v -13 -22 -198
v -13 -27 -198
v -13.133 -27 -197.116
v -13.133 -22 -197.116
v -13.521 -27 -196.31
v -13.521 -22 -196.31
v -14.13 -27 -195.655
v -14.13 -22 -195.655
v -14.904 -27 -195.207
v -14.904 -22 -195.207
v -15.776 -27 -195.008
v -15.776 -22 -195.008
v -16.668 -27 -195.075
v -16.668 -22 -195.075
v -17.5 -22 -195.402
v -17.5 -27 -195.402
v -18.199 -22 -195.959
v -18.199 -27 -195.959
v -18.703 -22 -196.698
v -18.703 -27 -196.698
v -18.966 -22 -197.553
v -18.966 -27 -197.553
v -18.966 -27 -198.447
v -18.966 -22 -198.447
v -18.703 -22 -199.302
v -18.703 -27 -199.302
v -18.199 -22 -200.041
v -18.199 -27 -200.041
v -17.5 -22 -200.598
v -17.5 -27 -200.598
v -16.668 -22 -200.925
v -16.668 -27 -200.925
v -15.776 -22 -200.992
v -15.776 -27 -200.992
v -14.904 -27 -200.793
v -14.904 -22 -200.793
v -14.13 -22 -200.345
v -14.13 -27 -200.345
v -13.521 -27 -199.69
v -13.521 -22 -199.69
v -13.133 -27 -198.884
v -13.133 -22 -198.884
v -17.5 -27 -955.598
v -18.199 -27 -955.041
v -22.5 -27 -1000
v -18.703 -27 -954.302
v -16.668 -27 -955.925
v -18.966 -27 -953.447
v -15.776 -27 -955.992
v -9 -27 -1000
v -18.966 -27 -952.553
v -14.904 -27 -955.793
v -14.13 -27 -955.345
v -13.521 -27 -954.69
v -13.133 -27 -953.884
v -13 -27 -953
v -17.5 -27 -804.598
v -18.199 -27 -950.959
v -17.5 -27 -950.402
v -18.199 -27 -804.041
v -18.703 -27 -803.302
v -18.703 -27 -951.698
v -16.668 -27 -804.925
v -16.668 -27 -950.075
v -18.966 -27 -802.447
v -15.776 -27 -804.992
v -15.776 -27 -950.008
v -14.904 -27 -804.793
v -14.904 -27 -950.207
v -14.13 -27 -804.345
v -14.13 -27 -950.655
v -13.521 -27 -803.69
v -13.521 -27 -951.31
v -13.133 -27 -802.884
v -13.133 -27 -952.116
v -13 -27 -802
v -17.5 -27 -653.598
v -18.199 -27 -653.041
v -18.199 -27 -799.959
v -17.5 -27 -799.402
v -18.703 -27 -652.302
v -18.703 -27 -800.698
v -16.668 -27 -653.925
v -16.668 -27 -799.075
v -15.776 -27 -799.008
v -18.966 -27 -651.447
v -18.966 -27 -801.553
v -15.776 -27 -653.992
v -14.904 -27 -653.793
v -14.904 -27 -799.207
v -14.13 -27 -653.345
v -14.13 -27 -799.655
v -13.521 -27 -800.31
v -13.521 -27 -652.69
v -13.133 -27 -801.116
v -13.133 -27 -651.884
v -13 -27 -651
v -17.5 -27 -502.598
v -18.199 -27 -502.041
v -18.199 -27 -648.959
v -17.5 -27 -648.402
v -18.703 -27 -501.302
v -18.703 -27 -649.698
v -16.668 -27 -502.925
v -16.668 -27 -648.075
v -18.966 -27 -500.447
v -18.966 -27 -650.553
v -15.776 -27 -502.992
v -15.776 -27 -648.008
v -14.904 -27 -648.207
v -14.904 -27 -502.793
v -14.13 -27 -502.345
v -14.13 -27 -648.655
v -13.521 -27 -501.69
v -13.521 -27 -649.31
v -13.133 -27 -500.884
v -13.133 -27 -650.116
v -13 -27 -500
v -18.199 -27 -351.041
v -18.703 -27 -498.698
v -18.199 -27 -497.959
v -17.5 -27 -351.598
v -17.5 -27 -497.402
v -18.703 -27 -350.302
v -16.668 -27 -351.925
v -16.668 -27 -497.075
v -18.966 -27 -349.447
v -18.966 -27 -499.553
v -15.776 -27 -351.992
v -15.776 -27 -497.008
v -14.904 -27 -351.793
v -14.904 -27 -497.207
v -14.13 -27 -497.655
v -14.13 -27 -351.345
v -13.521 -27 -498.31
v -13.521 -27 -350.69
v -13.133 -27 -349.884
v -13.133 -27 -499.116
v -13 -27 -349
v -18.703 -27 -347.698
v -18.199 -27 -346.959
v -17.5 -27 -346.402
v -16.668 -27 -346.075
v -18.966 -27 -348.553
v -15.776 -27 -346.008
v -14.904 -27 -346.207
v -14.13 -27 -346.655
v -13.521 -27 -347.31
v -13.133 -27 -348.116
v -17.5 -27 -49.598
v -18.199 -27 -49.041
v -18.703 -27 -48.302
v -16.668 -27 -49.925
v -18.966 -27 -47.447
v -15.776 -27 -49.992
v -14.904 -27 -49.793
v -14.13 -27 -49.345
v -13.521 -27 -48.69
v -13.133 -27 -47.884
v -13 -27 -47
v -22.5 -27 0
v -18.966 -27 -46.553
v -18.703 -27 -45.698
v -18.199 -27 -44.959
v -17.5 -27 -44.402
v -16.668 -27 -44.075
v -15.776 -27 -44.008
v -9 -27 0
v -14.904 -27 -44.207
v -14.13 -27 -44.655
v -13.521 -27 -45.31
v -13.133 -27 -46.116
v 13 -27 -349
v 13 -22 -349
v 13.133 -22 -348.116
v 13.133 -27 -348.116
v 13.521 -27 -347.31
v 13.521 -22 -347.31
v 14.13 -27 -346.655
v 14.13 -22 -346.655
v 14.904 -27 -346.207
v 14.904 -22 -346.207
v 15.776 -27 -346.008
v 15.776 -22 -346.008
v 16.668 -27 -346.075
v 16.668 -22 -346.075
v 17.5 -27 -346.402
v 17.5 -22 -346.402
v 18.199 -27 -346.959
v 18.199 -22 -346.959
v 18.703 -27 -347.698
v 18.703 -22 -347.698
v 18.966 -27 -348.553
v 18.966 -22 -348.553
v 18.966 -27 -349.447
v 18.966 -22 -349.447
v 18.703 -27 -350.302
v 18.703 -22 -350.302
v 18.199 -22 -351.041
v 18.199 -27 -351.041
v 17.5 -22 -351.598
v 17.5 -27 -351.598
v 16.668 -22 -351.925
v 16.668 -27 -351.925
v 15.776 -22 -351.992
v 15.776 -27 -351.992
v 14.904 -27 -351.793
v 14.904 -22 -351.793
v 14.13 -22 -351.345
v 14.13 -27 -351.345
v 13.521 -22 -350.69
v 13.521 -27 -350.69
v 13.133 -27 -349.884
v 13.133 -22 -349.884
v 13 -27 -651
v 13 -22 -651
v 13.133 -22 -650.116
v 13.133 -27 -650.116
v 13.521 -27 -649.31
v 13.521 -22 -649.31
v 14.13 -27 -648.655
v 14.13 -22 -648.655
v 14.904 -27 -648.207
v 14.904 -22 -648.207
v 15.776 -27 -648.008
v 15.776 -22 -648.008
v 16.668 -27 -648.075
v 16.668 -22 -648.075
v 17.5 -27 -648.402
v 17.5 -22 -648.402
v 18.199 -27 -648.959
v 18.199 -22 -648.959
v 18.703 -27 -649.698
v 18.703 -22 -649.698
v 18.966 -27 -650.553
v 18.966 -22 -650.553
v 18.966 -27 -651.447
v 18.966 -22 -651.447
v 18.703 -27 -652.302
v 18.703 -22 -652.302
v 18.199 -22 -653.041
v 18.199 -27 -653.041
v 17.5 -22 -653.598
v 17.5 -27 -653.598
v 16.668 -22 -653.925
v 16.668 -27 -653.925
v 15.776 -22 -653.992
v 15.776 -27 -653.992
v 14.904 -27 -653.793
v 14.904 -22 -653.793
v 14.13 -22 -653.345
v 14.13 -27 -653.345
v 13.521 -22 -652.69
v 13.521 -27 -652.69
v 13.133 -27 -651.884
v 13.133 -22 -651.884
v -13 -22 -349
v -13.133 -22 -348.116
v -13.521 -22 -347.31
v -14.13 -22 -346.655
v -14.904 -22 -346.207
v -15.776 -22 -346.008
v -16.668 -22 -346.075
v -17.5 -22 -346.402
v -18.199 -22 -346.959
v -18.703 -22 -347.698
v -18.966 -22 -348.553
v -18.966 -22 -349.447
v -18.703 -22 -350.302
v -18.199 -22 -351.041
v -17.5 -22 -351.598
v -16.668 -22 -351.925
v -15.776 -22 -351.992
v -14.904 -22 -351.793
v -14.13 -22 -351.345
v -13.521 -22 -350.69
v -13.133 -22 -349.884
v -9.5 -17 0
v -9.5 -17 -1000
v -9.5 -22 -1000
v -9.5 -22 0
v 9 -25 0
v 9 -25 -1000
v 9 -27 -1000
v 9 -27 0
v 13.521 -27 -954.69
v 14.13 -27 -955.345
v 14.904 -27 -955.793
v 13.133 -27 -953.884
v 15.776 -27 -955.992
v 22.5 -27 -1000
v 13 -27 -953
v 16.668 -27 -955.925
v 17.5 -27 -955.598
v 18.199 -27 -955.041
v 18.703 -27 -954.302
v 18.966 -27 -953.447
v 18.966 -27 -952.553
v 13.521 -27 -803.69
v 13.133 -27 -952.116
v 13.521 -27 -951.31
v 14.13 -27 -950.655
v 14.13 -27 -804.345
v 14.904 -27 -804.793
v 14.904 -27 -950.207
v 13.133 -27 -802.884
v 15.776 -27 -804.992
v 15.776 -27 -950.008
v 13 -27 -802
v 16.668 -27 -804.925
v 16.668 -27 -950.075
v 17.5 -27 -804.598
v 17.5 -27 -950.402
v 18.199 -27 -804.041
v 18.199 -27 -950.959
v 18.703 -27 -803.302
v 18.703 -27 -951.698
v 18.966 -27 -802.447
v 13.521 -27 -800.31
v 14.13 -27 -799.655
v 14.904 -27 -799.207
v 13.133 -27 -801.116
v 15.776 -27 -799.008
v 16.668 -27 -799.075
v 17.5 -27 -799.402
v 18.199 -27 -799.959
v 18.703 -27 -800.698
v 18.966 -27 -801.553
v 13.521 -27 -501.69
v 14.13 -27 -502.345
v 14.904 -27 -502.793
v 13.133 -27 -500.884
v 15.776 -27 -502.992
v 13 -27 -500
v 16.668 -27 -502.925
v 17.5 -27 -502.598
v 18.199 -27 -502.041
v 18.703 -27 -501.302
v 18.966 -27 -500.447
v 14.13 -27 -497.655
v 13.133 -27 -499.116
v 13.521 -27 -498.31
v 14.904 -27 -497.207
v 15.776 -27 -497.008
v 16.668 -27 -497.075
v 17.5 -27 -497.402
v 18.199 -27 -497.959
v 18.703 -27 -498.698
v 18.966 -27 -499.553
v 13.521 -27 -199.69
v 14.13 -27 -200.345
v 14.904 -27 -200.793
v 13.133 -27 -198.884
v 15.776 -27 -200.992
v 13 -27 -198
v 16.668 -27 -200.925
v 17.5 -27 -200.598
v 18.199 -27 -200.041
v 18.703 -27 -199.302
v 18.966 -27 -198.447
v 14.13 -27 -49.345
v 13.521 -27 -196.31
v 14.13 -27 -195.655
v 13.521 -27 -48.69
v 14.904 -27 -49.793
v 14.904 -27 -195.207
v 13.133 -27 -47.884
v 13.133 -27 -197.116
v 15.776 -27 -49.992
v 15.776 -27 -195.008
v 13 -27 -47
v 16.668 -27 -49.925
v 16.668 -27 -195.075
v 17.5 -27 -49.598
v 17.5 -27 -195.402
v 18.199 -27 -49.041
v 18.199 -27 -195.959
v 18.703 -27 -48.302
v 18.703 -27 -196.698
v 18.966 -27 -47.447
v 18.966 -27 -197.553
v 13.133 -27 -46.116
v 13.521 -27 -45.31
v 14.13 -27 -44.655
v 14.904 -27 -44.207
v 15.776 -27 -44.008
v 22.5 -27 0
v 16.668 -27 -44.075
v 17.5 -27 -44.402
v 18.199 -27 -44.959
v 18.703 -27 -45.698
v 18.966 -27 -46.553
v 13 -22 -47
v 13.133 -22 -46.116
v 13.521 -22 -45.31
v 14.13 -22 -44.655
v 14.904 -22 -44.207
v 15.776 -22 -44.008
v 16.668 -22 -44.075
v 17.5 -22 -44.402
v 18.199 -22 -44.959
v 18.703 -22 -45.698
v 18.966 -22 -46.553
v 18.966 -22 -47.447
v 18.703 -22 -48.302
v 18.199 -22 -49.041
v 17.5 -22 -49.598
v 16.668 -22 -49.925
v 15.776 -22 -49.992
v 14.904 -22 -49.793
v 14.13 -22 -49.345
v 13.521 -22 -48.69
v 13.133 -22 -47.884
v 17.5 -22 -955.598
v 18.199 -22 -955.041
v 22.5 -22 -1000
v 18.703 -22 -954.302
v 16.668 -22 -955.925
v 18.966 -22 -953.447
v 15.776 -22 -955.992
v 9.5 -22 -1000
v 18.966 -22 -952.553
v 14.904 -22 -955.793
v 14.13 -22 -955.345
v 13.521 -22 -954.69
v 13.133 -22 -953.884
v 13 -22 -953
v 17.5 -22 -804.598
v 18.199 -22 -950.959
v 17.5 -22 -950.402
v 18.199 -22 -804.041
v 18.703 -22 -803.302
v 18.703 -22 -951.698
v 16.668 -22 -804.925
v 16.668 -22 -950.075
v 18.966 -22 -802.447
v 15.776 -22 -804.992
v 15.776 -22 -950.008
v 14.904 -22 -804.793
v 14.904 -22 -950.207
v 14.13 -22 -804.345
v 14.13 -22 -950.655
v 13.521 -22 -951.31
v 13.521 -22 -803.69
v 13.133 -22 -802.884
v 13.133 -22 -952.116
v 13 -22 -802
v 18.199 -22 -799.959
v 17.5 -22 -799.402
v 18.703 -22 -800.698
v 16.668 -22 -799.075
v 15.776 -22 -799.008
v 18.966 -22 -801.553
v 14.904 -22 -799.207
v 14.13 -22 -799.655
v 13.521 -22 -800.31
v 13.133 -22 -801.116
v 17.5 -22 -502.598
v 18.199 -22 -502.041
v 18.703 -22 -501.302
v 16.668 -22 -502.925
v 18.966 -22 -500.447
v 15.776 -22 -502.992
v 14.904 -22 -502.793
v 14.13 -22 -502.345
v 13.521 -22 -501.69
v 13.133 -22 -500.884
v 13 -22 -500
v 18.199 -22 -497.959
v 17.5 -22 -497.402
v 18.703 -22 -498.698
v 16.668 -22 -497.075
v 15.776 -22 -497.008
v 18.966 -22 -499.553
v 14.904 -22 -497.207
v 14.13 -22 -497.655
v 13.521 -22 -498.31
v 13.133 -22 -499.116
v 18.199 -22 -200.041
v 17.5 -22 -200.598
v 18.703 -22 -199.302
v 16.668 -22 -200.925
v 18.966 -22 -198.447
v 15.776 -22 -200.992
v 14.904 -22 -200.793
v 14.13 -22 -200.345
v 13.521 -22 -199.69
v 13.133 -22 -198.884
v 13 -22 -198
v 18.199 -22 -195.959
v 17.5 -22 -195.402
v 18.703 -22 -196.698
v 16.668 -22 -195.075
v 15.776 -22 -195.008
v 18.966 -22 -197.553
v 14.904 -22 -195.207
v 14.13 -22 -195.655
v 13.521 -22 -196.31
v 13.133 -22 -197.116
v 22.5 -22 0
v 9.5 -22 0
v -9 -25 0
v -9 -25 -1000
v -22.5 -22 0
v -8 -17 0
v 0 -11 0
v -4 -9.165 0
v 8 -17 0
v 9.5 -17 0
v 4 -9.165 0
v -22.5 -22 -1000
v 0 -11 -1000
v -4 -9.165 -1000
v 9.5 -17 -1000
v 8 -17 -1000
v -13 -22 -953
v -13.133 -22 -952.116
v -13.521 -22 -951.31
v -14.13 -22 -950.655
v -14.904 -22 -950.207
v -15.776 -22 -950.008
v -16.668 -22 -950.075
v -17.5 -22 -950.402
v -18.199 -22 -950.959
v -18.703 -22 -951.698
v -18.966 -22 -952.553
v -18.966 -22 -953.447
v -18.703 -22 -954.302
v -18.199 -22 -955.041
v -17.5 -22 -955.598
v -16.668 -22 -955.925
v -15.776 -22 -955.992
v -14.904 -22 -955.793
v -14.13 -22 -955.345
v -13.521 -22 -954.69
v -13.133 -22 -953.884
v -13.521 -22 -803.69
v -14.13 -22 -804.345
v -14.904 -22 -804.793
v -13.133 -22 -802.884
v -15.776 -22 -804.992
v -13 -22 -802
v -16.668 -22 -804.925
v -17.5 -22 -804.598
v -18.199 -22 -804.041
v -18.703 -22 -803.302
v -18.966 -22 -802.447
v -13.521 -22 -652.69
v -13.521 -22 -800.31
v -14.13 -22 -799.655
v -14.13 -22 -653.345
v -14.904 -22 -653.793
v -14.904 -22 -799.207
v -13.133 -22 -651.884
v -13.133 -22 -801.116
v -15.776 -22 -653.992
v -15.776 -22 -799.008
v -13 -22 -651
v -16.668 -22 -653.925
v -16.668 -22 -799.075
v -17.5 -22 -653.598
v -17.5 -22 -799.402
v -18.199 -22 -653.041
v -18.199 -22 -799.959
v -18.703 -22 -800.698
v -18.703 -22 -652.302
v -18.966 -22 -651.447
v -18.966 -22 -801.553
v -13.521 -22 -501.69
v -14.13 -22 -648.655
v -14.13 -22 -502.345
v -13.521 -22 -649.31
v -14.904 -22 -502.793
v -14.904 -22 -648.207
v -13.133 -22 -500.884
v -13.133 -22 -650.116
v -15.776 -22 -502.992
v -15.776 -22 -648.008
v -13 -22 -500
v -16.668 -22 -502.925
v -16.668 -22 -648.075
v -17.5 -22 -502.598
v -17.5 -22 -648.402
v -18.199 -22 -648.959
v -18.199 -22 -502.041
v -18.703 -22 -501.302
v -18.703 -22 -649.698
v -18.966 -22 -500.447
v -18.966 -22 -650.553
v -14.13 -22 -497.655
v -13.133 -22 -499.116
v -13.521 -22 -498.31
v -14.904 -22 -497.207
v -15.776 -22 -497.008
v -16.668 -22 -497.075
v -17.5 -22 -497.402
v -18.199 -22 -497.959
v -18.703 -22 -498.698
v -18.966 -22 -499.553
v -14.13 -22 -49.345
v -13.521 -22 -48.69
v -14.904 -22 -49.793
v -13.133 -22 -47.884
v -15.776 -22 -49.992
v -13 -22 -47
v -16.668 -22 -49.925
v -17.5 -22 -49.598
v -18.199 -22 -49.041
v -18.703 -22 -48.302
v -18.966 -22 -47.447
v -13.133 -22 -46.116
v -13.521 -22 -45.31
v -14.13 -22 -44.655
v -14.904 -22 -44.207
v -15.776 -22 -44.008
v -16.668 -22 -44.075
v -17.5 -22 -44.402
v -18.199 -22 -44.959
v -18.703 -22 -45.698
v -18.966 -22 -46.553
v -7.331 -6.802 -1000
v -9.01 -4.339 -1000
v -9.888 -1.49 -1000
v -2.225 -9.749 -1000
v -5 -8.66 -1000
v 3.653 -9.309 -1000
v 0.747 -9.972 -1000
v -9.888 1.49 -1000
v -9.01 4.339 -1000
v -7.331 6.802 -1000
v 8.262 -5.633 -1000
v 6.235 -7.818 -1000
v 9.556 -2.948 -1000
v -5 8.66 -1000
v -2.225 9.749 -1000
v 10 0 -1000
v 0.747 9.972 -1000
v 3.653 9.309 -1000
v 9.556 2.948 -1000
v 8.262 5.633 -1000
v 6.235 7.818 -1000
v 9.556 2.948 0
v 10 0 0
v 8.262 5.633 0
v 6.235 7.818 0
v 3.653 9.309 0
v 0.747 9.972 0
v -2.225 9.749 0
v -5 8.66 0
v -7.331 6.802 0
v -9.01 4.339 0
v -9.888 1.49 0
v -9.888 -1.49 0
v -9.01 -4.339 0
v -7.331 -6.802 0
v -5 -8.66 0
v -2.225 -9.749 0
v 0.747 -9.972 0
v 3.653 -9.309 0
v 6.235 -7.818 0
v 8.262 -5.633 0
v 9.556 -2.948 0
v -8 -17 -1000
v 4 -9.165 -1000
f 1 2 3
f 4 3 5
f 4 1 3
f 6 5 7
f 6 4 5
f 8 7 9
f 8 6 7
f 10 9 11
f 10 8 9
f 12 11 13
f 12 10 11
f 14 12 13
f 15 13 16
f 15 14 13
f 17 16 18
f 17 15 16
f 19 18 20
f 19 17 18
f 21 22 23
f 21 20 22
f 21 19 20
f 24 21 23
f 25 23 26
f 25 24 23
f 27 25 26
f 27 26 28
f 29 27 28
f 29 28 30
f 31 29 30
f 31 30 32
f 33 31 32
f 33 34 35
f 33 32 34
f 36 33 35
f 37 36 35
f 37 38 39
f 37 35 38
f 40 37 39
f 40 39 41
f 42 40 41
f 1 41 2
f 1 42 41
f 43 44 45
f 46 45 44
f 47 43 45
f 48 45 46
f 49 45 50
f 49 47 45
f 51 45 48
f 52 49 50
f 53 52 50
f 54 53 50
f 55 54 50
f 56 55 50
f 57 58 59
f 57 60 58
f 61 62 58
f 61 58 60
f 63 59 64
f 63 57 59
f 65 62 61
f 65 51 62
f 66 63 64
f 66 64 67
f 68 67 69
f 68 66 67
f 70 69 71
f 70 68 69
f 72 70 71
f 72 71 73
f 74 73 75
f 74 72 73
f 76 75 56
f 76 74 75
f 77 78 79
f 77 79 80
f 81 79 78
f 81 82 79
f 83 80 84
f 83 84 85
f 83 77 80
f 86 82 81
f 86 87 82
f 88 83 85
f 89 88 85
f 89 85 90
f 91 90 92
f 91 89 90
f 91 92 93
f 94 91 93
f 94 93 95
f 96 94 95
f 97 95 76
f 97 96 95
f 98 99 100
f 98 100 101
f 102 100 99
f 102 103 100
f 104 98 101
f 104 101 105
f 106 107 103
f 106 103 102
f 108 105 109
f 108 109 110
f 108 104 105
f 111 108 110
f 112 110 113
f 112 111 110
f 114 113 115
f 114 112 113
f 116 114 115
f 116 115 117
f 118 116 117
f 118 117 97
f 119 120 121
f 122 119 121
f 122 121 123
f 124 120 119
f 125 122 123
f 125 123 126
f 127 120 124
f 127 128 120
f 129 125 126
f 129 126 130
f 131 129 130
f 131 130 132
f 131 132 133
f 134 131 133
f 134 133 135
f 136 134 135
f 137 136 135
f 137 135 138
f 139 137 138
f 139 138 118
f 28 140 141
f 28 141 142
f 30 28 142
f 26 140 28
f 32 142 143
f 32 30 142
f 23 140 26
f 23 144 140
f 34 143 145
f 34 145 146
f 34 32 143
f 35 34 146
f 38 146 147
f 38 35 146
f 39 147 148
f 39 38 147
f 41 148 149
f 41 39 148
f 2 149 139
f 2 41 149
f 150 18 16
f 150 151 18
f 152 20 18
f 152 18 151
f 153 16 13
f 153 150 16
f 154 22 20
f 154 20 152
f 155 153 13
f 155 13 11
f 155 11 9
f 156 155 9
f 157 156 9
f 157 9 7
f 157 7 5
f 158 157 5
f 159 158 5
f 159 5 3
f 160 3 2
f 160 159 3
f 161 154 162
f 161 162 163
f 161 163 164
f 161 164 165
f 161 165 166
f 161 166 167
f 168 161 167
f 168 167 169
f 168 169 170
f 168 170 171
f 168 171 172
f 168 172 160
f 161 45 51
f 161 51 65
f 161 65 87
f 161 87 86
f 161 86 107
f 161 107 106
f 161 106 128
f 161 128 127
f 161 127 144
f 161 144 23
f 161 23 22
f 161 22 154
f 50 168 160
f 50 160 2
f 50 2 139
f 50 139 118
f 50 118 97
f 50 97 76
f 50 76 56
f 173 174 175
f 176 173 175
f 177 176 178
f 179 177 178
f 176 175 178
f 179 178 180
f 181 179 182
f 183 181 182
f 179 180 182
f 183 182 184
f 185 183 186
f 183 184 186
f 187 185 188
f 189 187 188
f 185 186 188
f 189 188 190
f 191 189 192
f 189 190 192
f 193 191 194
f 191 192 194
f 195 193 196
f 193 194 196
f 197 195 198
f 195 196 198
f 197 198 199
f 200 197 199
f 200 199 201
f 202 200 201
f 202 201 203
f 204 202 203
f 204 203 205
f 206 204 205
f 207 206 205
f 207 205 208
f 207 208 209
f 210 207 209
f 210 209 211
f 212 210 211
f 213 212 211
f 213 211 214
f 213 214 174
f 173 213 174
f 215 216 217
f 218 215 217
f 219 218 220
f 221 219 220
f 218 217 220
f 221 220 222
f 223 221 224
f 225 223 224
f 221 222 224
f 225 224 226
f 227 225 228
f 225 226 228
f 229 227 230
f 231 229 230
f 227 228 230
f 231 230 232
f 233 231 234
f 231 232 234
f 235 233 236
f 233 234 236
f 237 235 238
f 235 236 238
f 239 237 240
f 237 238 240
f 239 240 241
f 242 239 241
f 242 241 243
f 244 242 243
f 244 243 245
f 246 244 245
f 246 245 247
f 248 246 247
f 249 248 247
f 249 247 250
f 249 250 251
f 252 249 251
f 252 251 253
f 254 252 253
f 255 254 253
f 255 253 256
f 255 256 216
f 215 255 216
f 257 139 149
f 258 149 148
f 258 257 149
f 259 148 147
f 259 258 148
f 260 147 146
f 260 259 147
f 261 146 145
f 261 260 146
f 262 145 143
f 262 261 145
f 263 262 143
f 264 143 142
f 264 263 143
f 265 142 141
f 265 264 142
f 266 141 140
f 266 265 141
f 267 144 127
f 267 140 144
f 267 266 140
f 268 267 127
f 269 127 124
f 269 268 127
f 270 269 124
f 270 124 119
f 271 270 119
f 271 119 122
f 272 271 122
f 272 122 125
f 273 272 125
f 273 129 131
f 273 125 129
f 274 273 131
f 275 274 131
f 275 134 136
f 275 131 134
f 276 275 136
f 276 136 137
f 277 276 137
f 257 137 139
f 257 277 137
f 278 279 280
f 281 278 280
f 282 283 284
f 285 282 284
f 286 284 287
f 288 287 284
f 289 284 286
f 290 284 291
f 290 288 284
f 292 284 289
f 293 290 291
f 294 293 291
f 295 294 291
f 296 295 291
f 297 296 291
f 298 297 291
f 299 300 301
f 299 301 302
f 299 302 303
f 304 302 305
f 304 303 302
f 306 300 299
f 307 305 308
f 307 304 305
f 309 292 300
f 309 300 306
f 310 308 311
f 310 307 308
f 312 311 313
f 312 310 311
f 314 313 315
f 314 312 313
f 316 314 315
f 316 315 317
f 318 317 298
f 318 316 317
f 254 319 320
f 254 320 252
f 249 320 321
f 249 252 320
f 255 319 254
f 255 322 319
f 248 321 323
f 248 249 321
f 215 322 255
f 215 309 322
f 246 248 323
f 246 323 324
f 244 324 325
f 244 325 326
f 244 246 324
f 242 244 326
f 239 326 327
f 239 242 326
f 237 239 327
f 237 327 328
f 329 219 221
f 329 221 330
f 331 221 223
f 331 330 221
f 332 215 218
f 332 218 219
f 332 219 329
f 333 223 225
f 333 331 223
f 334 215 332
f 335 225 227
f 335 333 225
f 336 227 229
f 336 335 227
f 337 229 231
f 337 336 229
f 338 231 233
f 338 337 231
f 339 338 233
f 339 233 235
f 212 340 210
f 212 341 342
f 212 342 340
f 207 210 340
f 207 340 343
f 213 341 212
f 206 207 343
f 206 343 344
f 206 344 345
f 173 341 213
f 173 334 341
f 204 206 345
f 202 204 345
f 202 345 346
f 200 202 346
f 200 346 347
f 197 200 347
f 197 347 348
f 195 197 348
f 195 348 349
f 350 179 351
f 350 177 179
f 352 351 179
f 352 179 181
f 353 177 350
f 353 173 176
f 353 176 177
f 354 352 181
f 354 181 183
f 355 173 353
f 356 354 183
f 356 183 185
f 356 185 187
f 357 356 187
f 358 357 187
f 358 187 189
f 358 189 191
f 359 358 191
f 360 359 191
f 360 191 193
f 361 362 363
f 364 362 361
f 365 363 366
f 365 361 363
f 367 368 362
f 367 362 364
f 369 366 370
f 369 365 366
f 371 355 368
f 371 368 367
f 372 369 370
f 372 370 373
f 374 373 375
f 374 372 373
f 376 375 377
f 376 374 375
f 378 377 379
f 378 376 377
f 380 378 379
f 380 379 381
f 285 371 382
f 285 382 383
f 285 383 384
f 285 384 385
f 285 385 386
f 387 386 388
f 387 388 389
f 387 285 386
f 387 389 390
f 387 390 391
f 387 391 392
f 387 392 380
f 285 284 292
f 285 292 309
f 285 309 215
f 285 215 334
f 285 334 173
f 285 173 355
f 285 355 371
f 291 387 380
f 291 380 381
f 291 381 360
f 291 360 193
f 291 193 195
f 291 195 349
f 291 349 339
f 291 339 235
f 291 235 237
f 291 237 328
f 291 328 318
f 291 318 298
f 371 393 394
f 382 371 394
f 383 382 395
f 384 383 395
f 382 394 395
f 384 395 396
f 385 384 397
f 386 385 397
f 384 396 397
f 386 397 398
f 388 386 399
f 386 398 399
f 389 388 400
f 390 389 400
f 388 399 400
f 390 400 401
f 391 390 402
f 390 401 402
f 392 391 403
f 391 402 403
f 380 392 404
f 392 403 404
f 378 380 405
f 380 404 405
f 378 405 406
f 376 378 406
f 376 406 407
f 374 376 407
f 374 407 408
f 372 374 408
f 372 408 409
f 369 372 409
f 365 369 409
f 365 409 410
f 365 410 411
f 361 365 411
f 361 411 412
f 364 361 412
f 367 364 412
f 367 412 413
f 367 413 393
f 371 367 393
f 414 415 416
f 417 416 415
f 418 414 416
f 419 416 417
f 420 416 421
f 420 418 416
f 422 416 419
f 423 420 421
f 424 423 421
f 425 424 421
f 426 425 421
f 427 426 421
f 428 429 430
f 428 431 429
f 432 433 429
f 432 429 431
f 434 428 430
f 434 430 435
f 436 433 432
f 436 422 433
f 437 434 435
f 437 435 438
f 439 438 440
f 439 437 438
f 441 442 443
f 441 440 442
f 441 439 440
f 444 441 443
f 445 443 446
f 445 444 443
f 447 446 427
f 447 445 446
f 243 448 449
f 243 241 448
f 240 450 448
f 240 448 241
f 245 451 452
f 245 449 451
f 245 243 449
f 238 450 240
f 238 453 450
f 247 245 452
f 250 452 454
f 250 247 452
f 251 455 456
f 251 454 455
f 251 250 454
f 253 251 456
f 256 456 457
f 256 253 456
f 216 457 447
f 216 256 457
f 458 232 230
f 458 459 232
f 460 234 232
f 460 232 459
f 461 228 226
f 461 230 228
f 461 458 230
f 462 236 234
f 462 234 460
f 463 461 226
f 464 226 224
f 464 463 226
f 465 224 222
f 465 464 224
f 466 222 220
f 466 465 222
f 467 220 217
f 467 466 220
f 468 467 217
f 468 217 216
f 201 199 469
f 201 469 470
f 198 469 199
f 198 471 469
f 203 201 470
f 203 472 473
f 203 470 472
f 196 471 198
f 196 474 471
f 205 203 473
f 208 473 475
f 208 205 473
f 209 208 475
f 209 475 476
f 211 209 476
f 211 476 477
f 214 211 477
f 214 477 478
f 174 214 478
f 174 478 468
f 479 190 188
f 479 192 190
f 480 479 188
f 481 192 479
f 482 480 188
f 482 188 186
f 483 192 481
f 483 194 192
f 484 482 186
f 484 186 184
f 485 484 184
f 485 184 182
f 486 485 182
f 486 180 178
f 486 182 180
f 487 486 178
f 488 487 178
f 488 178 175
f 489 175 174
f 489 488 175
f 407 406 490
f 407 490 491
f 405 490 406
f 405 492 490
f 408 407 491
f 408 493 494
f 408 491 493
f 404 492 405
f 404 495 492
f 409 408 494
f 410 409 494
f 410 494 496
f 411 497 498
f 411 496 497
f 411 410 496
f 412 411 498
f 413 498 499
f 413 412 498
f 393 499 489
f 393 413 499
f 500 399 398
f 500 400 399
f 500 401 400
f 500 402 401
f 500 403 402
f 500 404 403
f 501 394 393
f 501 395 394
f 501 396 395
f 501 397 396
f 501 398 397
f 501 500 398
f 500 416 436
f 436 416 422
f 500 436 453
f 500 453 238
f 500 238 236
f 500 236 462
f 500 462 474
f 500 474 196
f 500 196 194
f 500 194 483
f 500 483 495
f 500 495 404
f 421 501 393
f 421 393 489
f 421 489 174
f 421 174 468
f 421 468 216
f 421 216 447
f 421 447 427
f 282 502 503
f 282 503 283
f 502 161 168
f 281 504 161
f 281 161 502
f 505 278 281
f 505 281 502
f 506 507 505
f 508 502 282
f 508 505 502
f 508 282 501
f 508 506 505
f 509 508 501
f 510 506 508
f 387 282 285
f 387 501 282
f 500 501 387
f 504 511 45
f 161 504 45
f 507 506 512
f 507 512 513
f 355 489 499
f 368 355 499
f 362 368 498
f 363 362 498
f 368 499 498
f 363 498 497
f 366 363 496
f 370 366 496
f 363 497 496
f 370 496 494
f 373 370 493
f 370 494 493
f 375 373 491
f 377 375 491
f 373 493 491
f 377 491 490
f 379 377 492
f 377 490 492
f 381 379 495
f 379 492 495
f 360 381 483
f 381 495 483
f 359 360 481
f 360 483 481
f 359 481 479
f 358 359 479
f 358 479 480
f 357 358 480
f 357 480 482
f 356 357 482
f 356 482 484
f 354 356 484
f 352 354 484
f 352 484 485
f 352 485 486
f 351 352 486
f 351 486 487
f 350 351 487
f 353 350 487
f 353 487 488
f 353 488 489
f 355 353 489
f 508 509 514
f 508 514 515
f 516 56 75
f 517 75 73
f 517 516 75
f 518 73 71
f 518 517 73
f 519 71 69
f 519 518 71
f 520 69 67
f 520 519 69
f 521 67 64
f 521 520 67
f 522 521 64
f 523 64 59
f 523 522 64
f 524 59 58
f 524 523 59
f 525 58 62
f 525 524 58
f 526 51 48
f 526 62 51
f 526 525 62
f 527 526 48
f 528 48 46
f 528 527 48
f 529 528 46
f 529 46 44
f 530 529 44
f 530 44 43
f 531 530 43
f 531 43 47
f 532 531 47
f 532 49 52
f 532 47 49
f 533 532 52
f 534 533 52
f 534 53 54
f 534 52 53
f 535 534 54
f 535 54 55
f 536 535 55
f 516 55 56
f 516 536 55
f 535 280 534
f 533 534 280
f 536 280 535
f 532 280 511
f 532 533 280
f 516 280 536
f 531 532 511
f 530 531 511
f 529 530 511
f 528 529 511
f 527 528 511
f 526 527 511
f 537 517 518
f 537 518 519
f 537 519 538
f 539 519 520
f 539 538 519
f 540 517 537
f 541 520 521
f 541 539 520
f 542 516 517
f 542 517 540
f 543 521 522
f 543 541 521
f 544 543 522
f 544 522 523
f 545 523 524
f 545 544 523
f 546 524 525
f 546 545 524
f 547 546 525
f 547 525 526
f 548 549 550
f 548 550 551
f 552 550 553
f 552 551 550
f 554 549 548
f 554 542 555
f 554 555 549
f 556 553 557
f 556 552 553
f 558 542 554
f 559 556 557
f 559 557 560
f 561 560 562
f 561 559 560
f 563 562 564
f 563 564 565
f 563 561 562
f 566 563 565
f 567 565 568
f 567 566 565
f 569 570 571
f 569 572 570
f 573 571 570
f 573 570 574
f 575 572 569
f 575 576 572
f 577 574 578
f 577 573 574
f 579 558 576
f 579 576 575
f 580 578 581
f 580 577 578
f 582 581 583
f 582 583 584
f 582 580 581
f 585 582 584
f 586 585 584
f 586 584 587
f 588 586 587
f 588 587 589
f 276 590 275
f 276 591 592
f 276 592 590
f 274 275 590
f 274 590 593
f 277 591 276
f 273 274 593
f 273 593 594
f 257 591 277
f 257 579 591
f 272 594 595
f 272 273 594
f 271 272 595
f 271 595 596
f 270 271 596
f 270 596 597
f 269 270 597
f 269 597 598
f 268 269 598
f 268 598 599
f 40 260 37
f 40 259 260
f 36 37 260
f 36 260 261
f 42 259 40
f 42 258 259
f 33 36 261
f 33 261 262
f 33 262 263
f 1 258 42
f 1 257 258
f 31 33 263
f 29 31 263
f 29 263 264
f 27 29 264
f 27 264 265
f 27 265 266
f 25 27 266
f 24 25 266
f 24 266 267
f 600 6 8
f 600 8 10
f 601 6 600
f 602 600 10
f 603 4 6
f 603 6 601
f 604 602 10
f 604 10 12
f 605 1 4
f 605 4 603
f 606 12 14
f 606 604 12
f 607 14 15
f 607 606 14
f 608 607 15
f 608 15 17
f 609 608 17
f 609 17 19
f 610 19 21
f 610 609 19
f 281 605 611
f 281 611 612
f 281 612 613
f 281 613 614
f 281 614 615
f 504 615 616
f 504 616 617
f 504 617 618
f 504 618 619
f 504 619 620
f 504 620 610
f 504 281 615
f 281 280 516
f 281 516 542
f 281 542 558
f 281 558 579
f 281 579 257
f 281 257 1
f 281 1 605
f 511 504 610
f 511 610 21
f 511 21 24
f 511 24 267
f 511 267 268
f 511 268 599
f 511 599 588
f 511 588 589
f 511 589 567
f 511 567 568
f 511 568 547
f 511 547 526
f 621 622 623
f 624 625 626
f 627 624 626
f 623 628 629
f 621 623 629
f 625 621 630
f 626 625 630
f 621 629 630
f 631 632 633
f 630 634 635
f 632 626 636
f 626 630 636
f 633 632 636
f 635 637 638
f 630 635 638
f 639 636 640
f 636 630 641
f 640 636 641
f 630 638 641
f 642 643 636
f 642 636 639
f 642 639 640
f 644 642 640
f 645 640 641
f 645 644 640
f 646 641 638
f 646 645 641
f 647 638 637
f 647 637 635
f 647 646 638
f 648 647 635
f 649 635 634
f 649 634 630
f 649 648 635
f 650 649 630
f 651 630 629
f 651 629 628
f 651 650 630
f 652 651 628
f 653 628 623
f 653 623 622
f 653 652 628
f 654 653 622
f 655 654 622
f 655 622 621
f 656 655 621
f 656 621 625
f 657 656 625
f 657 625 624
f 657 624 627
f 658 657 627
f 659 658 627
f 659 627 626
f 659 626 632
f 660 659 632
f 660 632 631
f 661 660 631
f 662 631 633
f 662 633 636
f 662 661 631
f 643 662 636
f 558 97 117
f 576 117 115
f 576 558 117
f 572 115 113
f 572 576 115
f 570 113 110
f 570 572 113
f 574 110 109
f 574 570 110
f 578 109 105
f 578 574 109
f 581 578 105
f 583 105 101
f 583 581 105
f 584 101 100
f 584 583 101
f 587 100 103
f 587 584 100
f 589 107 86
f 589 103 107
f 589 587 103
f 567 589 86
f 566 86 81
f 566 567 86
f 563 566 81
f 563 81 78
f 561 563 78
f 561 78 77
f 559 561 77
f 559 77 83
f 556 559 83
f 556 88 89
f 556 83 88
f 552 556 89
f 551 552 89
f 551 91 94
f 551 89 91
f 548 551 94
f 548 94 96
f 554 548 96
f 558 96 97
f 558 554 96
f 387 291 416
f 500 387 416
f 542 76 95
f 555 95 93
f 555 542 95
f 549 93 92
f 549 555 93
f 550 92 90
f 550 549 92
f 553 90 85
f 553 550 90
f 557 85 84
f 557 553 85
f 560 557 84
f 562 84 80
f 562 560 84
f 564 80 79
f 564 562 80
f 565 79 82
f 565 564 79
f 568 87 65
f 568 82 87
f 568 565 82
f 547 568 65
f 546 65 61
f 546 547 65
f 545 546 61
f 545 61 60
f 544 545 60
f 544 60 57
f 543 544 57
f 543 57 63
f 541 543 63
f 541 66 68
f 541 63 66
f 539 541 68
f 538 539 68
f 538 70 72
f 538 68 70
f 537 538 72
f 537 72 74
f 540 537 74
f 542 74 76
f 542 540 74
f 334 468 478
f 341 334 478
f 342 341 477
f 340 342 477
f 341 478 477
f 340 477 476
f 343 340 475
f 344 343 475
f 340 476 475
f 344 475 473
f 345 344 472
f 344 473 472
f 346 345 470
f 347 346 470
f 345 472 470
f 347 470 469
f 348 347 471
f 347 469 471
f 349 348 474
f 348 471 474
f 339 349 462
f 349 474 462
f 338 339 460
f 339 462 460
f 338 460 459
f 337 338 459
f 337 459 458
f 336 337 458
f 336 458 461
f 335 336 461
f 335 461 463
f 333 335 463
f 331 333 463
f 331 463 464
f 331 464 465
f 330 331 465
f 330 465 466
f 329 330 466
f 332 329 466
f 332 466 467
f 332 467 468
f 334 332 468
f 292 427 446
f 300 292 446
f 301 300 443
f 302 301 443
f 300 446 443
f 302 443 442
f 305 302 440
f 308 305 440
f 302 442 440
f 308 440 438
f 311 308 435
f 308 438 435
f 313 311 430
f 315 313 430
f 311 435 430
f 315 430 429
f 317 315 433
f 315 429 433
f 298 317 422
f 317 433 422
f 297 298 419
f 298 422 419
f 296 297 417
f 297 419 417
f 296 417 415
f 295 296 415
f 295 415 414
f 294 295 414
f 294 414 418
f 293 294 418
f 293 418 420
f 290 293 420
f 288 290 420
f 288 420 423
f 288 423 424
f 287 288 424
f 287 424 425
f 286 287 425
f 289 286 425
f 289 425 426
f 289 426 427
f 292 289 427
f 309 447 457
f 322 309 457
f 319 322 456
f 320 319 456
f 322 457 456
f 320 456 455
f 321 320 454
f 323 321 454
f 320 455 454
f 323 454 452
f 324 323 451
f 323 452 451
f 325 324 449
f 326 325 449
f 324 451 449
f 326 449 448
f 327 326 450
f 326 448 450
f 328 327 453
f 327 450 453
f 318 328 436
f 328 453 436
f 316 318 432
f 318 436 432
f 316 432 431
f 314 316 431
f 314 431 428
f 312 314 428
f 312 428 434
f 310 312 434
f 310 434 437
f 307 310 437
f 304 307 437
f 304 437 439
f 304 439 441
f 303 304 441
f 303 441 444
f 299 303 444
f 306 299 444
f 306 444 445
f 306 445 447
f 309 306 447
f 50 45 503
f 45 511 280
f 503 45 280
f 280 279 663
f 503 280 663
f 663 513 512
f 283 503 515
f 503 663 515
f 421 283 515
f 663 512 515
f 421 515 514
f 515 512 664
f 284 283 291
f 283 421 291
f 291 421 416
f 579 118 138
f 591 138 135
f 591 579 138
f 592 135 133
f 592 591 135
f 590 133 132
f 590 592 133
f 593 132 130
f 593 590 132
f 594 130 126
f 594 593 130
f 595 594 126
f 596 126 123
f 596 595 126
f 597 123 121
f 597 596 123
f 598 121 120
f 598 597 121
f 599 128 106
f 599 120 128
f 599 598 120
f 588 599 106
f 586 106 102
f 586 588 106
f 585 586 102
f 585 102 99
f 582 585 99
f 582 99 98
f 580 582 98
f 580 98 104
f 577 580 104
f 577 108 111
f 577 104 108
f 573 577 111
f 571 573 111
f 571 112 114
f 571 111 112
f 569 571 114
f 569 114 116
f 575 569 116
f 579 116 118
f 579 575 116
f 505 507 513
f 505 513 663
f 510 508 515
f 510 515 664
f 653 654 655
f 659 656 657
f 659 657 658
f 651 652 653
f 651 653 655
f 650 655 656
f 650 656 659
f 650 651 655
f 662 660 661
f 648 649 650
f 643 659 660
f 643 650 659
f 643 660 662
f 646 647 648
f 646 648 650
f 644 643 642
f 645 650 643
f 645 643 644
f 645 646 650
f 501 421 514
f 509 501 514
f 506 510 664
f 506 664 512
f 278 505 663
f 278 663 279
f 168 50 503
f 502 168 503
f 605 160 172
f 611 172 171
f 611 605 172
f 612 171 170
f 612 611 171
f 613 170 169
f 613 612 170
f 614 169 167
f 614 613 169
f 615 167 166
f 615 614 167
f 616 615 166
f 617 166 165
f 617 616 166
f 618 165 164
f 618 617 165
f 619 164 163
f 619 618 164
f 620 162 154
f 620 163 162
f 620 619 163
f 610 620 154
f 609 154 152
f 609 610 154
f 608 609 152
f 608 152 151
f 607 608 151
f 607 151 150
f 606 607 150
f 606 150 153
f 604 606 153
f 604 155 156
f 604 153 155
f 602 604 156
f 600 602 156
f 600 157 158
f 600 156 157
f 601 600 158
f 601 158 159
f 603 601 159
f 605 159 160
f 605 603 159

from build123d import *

# Parameters (mm, degrees)
SKETCH1_R             = 10
BOSS_EXTRUDE1_DEPTH   = 1000
BOSS_EXTRUDE1_2_DEPTH = 1000
SKETCH2_R             = 3
CUT_EXTRUDE1_DEPTH    = 1000


with BuildPart() as part:
    # Sketch1 → Boss-Extrude1 (new body)
    with BuildSketch(Plane.XY):
        Circle(SKETCH1_R)
    extrude(amount=-BOSS_EXTRUDE1_DEPTH)


with BuildPart() as body_2:
    # Sketch1 → Boss-Extrude1 2 (new body)
    with BuildSketch(Plane.XY):
        Polygon((-22.5, -27), (-9, -27), (-9, -25), (9, -25), (9, -27), (22.5, -27), (22.5, -22), (9.5, -22), (9.5, -17), (8, -17), (4, -9.16515139), (0, -11), (-4, -9.16515139), (-8, -17), (-9.5, -17), (-9.5, -22), (-22.5, -22), align=None)
    extrude(amount=-BOSS_EXTRUDE1_2_DEPTH)

    # Sketch2 → Cut-Extrude1 (cut)
    with BuildSketch(Plane(origin=(0, -22, 0), x_dir=(1, 0, 0), z_dir=(0, 1, 0))):
        with Locations(Location((16, 47, 0), (0, 0, 180))):
            Circle(SKETCH2_R)
        with Locations(Location((16, 198, 0), (0, 0, 180))):
            Circle(SKETCH2_R)
        with Locations(Location((16, 349, 0), (0, 0, 180))):
            Circle(SKETCH2_R)
        with Locations(Location((16, 500, 0), (0, 0, 180))):
            Circle(SKETCH2_R)
        with Locations(Location((16, 651, 0), (0, 0, 180))):
            Circle(SKETCH2_R)
        with Locations(Location((16, 802, 0), (0, 0, 180))):
            Circle(SKETCH2_R)
        with Locations(Location((16, 953, 0), (0, 0, 180))):
            Circle(SKETCH2_R)
    cut_extrude1 = extrude(amount=-CUT_EXTRUDE1_DEPTH, mode=Mode.SUBTRACT)

    # Mirror1: Cut-Extrude1 across plane
    add(cut_extrude1.mirror(Plane(origin=(0, 0, 0), x_dir=(0, 0, 1), z_dir=(1, 0, 0))), mode=Mode.SUBTRACT)


solid = Compound([part.part, body_2.part])
